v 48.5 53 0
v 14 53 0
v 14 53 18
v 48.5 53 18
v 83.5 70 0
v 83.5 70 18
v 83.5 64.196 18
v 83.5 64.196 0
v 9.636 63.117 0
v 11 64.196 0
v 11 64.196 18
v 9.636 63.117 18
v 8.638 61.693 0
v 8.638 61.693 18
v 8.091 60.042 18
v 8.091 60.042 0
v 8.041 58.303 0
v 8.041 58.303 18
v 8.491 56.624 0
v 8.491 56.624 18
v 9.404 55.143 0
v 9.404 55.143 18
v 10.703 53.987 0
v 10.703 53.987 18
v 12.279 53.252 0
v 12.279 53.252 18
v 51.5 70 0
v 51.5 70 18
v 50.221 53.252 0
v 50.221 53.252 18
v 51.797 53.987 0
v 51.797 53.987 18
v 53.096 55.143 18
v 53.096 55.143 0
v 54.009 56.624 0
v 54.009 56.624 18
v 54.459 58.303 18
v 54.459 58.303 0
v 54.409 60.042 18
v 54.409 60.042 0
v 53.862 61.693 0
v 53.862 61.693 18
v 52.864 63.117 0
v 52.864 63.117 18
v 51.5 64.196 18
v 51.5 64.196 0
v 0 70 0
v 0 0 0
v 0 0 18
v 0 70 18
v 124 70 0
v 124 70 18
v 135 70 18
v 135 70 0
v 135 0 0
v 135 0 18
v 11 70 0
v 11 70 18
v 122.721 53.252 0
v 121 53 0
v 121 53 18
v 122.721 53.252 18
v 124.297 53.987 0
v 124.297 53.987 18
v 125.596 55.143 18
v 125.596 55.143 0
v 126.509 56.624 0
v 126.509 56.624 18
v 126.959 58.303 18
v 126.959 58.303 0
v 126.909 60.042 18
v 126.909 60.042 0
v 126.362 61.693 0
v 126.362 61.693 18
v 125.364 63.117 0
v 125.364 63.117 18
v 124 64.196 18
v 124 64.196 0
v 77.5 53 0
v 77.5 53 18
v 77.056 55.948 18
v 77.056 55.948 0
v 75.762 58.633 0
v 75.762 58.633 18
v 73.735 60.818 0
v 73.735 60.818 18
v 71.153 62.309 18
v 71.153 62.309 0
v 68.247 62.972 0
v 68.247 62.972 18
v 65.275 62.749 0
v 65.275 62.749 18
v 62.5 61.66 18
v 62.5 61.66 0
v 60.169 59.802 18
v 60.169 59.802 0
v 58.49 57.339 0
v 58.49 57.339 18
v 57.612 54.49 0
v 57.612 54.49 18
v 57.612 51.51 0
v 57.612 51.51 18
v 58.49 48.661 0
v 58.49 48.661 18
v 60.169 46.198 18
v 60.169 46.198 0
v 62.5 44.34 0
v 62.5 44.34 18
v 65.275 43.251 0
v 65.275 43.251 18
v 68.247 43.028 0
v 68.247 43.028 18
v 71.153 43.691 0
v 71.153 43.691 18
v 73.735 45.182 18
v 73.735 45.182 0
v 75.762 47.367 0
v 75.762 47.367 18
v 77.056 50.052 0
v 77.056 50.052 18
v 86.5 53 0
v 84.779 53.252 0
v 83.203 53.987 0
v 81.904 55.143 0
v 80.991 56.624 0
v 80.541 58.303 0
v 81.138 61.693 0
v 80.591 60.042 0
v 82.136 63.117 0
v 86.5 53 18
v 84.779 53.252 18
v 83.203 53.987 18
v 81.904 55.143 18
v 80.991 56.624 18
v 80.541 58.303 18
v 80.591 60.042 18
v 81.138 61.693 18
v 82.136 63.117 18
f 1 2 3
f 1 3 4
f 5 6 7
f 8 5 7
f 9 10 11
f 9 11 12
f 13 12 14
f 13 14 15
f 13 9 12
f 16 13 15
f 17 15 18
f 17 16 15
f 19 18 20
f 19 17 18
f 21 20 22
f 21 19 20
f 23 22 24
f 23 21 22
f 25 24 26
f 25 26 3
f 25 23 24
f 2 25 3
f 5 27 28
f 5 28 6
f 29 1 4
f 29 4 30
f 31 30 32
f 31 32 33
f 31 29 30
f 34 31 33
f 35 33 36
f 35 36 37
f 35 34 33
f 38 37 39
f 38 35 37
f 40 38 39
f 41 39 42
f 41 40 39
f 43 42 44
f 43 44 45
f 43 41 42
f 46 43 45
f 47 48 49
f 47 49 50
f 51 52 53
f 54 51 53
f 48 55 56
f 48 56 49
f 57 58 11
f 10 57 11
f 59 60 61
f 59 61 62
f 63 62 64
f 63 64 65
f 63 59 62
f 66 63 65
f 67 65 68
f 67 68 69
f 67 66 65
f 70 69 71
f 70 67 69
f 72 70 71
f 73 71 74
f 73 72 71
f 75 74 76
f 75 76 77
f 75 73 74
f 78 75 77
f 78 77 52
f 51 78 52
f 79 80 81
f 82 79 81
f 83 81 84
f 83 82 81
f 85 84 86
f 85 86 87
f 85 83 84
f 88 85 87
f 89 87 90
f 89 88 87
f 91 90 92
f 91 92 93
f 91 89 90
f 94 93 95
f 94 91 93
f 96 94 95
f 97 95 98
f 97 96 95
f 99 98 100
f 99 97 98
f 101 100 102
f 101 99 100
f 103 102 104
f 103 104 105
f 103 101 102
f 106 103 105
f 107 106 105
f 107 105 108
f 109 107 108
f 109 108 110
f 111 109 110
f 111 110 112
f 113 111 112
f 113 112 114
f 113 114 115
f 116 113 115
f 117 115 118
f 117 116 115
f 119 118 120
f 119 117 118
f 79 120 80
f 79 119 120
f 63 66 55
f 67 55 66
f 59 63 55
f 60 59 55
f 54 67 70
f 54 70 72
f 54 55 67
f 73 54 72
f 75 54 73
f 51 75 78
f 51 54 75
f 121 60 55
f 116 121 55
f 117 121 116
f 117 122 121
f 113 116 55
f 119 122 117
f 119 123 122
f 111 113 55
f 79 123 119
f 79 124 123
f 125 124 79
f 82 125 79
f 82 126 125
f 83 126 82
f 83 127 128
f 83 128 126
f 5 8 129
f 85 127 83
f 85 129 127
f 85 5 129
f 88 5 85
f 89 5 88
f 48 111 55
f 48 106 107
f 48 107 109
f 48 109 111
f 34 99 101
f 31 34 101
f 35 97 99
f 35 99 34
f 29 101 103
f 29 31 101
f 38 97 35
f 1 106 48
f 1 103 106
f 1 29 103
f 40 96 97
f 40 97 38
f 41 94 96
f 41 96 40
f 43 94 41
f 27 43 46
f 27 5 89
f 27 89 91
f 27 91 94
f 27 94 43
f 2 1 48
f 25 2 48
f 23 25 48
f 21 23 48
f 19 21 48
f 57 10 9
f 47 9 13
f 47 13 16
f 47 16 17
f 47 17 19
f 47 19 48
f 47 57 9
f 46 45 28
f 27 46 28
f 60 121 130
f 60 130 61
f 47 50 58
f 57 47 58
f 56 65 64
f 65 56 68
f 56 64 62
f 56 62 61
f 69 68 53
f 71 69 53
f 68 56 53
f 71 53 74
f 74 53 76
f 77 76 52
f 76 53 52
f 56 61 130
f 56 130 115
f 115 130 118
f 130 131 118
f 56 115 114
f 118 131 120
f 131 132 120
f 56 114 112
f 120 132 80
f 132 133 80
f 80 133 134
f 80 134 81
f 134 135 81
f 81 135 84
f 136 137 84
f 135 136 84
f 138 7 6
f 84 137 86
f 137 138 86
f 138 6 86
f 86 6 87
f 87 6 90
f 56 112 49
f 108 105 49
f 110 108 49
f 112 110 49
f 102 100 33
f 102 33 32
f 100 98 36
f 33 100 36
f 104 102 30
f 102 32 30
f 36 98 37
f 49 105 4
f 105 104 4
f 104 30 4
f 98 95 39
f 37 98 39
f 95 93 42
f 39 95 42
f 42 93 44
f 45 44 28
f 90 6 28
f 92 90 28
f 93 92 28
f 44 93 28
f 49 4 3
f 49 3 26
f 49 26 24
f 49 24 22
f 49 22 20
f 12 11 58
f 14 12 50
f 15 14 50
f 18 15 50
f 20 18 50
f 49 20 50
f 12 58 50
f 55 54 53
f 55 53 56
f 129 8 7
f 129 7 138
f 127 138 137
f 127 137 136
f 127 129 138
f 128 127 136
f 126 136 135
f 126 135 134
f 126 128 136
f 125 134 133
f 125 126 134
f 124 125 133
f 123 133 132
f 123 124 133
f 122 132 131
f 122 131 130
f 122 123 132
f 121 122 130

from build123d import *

# Parameters (mm, degrees)
CROQUIS1_R              = 10
SALIENTE_EXTRUIR1_DEPTH = 18


with BuildPart() as part:
    # Croquis1 → Saliente-Extruir1 (new body)
    with BuildSketch(Plane.XY):
        with BuildLine():
            Line((0, 0), (0, 70))
            Line((0, 70), (11, 70))
            Line((11, 70), (11, 64.196152423))
            ThreePointArc((11, 64.196152423), (8.204445042, 57.447085729), (14, 53))
            Line((14, 53), (48.5, 53))
            ThreePointArc((48.5, 53), (54.295554958, 57.447085729), (51.5, 64.196152423))
            Line((51.5, 64.196152423), (51.5, 70))
            Line((51.5, 70), (83.5, 70))
            Line((83.5, 70), (83.5, 64.196152423))
            ThreePointArc((83.5, 64.196152423), (80.704445042, 57.447085729), (86.5, 53))
            Line((86.5, 53), (121, 53))
            ThreePointArc((121, 53), (126.795554958, 57.447085729), (124, 64.196152423))
            Line((124, 64.196152423), (124, 70))
            Line((124, 70), (135, 70))
            Line((135, 70), (135, 0))
            Line((135, 0), (0, 0))
        make_face()
        with Locations((67.5, 53)):
            Circle(CROQUIS1_R, mode=Mode.SUBTRACT)
    extrude(amount=SALIENTE_EXTRUIR1_DEPTH)


solid = part.part
